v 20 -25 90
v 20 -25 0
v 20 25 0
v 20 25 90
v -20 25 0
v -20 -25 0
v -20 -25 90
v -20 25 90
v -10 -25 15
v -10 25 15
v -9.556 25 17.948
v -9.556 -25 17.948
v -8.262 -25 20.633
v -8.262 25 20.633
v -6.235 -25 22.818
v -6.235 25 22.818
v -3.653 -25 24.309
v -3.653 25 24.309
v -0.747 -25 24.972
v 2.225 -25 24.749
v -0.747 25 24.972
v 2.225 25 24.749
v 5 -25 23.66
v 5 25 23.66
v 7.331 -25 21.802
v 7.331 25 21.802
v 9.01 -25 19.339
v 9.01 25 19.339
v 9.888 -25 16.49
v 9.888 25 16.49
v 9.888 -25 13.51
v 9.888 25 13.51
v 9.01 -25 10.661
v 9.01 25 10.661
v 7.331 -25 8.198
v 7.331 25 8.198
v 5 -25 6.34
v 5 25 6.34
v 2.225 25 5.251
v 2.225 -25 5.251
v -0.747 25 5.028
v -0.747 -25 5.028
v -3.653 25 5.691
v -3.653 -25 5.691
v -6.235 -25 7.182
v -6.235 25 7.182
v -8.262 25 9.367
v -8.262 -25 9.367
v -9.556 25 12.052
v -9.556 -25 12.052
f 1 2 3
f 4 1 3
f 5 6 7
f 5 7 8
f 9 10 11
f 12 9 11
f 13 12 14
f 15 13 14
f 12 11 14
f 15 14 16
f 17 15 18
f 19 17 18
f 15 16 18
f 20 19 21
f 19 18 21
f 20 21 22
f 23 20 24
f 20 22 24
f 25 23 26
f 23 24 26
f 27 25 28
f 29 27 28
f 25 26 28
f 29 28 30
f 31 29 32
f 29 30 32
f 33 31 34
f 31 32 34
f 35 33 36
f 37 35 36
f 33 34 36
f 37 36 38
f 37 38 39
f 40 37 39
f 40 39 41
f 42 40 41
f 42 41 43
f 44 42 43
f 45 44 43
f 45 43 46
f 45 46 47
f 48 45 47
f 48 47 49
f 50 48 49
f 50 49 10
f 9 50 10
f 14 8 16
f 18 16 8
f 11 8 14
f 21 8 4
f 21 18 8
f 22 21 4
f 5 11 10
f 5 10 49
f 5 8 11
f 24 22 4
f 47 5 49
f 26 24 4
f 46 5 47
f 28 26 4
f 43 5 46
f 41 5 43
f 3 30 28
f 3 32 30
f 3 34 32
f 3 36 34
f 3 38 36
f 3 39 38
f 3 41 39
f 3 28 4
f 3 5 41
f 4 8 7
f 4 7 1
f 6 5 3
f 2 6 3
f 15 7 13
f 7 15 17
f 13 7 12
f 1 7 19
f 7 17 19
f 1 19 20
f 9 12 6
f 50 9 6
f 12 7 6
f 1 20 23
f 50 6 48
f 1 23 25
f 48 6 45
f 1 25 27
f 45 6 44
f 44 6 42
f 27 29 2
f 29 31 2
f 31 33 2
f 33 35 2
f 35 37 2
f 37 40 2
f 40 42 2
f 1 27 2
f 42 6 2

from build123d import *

# Parameters (mm, degrees)
SKETCH1_W           = 40
SKETCH1_H           = 50
BOSS_EXTRUDE1_DEPTH = 90
CUT_EXTRUDE1_REACH  = 106.881
SKETCH2_R           = 10


with BuildPart() as part:
    # Sketch1 → Boss-Extrude1 (new body)
    with BuildSketch(Plane.XY):
        Rectangle(SKETCH1_W, SKETCH1_H)
    extrude(amount=BOSS_EXTRUDE1_DEPTH)

    # Sketch2 → Cut-Extrude1 (cut, up to next)
    with BuildSketch(Plane(origin=(0, 25, 0), x_dir=(1, 0, 0), z_dir=(0, 1, 0)), mode=Mode.PRIVATE) as cut_extrude1_sk1:
        with Locations(Location((0, -15, 0), (0, 0, 180))):
            Circle(SKETCH2_R)
    cut_extrude1_tool1 = extrude(cut_extrude1_sk1.sketch, amount=-CUT_EXTRUDE1_REACH, mode=Mode.PRIVATE) & part.part
    add(cut_extrude1_tool1.solids().sort_by_distance((0, 25, 15))[0], mode=Mode.SUBTRACT)


solid = part.part
